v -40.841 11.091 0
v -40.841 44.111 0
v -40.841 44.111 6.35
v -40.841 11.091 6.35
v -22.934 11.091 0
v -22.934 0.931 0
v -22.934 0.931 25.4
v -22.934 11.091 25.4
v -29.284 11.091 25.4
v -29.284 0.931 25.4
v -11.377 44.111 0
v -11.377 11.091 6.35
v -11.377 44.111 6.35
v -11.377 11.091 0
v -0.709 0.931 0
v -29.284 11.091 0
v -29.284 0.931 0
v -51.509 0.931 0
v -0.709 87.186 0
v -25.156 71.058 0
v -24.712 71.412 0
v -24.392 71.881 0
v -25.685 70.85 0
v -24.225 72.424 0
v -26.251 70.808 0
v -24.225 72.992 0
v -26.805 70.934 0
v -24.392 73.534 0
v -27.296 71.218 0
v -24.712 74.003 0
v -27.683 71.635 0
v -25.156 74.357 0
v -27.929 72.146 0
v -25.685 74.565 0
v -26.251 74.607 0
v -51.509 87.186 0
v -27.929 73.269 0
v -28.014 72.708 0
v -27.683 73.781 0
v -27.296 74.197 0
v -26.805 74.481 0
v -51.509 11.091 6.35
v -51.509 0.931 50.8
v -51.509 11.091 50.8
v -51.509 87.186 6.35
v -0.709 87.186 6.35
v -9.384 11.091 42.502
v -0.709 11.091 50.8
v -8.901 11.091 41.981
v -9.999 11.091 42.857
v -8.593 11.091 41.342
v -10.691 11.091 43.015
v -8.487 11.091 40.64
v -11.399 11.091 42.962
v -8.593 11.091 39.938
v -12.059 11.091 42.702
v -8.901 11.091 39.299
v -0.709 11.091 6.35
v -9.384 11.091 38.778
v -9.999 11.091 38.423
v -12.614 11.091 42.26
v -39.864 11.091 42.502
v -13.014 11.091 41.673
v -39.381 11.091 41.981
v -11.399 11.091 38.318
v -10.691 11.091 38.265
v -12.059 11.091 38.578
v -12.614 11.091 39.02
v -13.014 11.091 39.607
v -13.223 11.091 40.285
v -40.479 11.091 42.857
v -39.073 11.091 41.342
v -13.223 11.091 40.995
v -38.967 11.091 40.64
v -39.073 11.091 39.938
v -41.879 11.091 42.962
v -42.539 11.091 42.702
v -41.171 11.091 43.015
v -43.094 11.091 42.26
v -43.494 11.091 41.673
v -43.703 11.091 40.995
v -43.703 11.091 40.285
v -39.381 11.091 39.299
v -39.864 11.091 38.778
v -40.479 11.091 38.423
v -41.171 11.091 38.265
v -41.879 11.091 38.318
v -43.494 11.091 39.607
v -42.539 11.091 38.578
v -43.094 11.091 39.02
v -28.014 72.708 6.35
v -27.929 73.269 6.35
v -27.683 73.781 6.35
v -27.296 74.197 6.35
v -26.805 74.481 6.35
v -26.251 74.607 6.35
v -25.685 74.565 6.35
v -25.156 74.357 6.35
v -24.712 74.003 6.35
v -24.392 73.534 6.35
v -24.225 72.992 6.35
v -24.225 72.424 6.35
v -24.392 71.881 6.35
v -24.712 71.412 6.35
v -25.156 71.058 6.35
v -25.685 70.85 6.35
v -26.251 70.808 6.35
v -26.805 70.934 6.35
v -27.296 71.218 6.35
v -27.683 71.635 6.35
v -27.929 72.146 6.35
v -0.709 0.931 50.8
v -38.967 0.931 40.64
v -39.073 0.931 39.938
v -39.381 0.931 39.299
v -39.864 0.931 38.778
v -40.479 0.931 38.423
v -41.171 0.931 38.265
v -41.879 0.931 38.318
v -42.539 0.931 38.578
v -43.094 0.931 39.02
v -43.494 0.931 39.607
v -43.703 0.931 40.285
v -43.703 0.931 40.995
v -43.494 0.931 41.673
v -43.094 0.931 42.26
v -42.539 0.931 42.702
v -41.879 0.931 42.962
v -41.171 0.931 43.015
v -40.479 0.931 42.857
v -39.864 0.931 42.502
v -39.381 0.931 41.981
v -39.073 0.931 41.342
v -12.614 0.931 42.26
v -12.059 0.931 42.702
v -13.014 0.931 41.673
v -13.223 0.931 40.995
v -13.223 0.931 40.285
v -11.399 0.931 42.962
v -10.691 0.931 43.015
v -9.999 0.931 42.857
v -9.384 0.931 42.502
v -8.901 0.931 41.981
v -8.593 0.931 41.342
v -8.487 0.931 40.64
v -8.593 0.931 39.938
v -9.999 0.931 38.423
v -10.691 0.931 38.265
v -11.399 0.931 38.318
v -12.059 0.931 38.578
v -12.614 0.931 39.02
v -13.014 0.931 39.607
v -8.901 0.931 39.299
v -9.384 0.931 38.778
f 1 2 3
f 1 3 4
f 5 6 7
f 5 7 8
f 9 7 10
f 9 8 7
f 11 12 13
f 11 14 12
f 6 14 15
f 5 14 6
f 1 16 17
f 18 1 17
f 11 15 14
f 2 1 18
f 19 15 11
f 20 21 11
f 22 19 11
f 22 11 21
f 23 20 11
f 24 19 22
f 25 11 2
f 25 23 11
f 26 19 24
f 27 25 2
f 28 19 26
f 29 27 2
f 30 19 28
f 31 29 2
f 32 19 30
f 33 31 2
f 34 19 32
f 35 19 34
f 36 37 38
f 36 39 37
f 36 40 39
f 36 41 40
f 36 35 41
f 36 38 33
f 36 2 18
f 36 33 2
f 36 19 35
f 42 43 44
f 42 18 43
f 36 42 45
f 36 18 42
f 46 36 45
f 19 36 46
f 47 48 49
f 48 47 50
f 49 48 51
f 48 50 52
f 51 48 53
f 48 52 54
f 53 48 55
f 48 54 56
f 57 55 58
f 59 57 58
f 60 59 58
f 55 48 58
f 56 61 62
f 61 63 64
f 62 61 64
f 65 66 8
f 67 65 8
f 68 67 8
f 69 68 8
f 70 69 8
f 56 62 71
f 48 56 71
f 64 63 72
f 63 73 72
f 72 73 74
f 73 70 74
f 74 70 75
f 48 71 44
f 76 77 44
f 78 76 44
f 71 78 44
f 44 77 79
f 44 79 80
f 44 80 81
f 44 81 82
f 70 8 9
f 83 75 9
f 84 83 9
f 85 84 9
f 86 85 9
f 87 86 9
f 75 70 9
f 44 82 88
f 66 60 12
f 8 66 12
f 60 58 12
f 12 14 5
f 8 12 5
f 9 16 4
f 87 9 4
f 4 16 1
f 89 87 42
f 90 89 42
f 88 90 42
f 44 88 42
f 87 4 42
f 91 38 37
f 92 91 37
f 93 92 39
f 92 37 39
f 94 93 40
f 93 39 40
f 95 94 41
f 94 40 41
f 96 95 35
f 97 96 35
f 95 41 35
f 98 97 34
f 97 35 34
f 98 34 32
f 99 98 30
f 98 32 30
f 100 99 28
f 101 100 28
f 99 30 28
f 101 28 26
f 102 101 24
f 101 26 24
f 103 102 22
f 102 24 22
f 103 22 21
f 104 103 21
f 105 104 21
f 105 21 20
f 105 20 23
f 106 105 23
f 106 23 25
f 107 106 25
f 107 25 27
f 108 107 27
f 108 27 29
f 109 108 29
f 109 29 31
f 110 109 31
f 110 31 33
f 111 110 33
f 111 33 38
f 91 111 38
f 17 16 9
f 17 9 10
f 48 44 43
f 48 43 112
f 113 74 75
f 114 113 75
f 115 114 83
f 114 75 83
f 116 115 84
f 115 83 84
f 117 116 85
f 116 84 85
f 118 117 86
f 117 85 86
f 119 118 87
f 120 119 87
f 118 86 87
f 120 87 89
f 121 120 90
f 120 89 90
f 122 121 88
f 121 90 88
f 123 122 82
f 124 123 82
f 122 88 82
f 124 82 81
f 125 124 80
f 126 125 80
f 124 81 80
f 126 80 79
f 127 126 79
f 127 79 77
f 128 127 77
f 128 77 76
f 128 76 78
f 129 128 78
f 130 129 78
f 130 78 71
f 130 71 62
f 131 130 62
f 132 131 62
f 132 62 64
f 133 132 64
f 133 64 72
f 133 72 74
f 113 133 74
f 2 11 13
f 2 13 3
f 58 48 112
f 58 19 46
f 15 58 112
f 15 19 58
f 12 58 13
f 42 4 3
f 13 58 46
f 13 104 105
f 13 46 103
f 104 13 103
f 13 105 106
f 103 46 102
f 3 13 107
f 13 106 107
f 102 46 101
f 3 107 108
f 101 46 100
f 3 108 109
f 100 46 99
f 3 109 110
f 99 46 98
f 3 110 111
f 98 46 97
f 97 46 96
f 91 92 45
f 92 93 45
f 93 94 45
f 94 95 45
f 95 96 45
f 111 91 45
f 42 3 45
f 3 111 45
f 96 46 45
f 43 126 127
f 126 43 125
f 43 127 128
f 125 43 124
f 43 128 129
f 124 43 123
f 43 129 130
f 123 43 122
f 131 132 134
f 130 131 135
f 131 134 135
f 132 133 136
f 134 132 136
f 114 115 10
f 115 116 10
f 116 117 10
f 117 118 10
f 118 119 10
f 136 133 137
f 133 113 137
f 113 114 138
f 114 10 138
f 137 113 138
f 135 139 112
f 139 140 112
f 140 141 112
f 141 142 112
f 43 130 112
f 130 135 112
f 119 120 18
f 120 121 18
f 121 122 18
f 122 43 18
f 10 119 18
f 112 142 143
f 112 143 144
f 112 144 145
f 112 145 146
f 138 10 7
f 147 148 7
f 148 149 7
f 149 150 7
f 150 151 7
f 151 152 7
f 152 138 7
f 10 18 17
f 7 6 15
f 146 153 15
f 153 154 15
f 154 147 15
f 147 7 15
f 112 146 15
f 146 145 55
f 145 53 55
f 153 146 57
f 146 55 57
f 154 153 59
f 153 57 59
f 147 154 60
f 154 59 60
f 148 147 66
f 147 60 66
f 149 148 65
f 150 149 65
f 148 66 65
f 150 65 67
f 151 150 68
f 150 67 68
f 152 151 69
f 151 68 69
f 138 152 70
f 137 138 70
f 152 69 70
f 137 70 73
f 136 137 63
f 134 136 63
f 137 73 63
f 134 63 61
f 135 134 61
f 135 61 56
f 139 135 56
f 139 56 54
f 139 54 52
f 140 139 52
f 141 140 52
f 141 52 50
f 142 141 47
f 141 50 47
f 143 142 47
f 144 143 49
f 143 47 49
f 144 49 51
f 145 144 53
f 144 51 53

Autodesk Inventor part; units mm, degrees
ref_plane "YZ Plane" through (0, 0, 0) normal (1, 0, 0) x (0, 1, 0)
ref_plane "XZ Plane" through (0, 0, 0) normal (0, 1, 0) x (-1, 0, 0)
ref_plane "XY Plane" through (0, 0, 0) normal (0, 0, 1) x (1, 0, 0)
sketch "Sketch1" plane through (0, 0, 0) normal (0, 0, 1) x (1, 0, 0)
  line L0 (-51.5087, 0.9312) -> (-0.7087, 0.9312)
  line L1 (-0.7087, 0.9312) -> (-0.7087, 11.0912)
  line L2 (-0.7087, 11.0912) -> (-51.5087, 11.0912)
  line L3 (-51.5087, 11.0912) -> (-51.5087, 0.9312)
  dimension "d1" = 10.16
  dimension "d2" = 50.8
extrude "Extrusion1" add sketch "Sketch1" along normal blind 50.8
sketch "Sketch2" plane through (0, 0, 0) normal (0, 0, -1) x (-1, 0, 0)
  arc A0 (43.6087, 20.9733) -> (43.6087, 27.9733) centre (43.6087, 24.4733) ccw
  line L0 (8.6087, 27.9733) -> (12.5532, 27.9733)
  line L1 (8.6087, 27.9733) -> (12.5532, 27.9733)
  line L2 (8.6087, 20.9733) -> (12.5532, 20.9733)
  line L3 (8.6087, 20.9733) -> (12.5532, 20.9733)
  arc A1 (9.0398, 27.9733) -> (9.0398, 20.9733) centre (8.6512, 24.4733) ccw
  line L4 (43.6087, 27.9733) -> (39.6641, 27.9733)
  line L5 (39.6641, 27.9733) -> (43.6087, 27.9733)
  line L6 (43.6087, 20.9733) -> (39.6641, 20.9733)
  line L7 (39.6641, 20.9733) -> (43.6087, 20.9733)
  arc A2 (18.8087, 11.9789) -> (18.362, 12.8118) centre (17.8087, 11.9789) ccw
  line L8 (18.8087, 8.6771) -> (18.8087, 11.5509)
  line L9 (18.8087, 11.9789) -> (18.8087, 8.6771)
  line L10 (18.8087, 8.6771) -> (18.8087, 7.6771)
  arc A3 (18.8087, 8.6771) -> (19.8087, 7.6771) centre (19.8087, 8.6771) ccw
  line L11 (18.8087, 7.6771) -> (33.4087, 7.6771)
  line L12 (33.4087, 11.9789) -> (33.4087, 11.5509)
  line L13 (33.4087, 7.6771) -> (33.4087, 11.9789)
  arc A4 (33.8554, 12.8118) -> (33.4087, 11.9789) centre (34.4087, 11.9789) ccw
  arc A5 (33.4087, 11.9789) -> (33.4087, 11.9789) centre (34.4087, 11.9789) ccw
  arc A6 (18.8087, 11.9789) -> (18.362, 12.8118) centre (17.8087, 11.9789) ccw
  arc A7 (12.5532, 20.9733) -> (18.362, 12.8118) centre (26.1087, 24.4733) ccw
  arc A8 (33.8554, 12.8118) -> (39.6641, 20.9733) centre (26.1087, 24.4733) ccw
  arc A9 (39.6641, 27.9733) -> (12.5532, 27.9733) centre (26.1087, 24.4733) ccw
  line L14 (0.7087, 11.0912) -> (51.5087, 11.0912) projected
  circle A10 centre (26.1087, 24.4733) radius 14
  line L15 (0.7087, 0.9312) -> (0.7087, 11.0912) projected
  line L16 (0.7087, 11.0912) -> (51.5087, 11.0912)
  line L17 (51.5087, 11.0912) -> (51.5087, 61.8912)
  line L18 (51.5087, 61.8912) -> (0.7087, 61.8912)
  line L19 (0.7087, 61.8912) -> (0.7087, 11.0912)
  line L20 (11.3767, 28.2833) -> (11.3767, 11.0912)
  line L21 (11.3767, 28.2833) -> (11.3767, 44.1112)
  line L22 (11.3767, 44.1112) -> (40.8407, 44.1112)
  line L23 (40.8407, 44.1112) -> (40.8407, 11.0912)
  point P0 (0, 0)
  point P1 (26.1087, 11.0912)
  dimension "d6" = 0
  dimension "d7" = 50.8
  dimension "d9" = 14.732
  dimension "d10" = 14.732
  dimension "d11" = 33.02
extrude "Extrusion2" add sketch "Sketch2" against normal blind 6.35 contours L6 L23 L4 A0 | A0 L4 L23 L22 L21 L20 L0 A1 L2 L14 L19 L18 L17 L6 | L20 L2 A1 L0
sketch "Sketch3" plane through (0, 0, 0) normal (0, 0, -1) x (-1, 0, 0)
  arc A0 (43.6087, 24.541) -> (43.6087, 31.541) centre (43.6087, 28.041) ccw
  line L0 (8.6087, 31.541) -> (12.5532, 31.541)
  line L1 (8.6087, 31.541) -> (12.5532, 31.541)
  line L2 (8.6087, 24.541) -> (12.5532, 24.541)
  line L3 (8.6087, 24.541) -> (12.5532, 24.541)
  arc A1 (9.0398, 31.541) -> (9.0398, 24.541) centre (8.6512, 28.041) ccw
  line L4 (43.6087, 31.541) -> (39.6641, 31.541)
  line L5 (39.6641, 31.541) -> (43.6087, 31.541)
  line L6 (43.6087, 24.541) -> (39.6641, 24.541)
  line L7 (39.6641, 24.541) -> (43.6087, 24.541)
  arc A2 (18.8087, 15.5466) -> (18.362, 16.3795) centre (17.8087, 15.5466) ccw
  line L8 (18.8087, 12.2448) -> (18.8087, 15.1185)
  line L9 (18.8087, 15.5466) -> (18.8087, 12.2448)
  line L10 (18.8087, 12.2448) -> (18.8087, 11.2448)
  arc A3 (18.8087, 12.2448) -> (19.8087, 11.2448) centre (19.8087, 12.2448) ccw
  line L11 (18.8087, 11.2448) -> (33.4087, 11.2448)
  line L12 (33.4087, 15.5466) -> (33.4087, 15.1185)
  line L13 (33.4087, 11.2448) -> (33.4087, 15.5466)
  arc A4 (33.8554, 16.3795) -> (33.4087, 15.5466) centre (34.4087, 15.5466) ccw
  arc A5 (33.4087, 15.5466) -> (33.4087, 15.5466) centre (34.4087, 15.5466) ccw
  arc A6 (18.8087, 15.5466) -> (18.362, 16.3795) centre (17.8087, 15.5466) ccw
  arc A7 (12.5532, 24.541) -> (18.362, 16.3795) centre (26.1087, 28.041) ccw
  arc A8 (33.8554, 16.3795) -> (39.6641, 24.541) centre (26.1087, 28.041) ccw
  arc A9 (39.6641, 31.541) -> (12.5532, 31.541) centre (26.1087, 28.041) ccw
  line L14 (11.3767, 11.0912) -> (40.8407, 11.0912) projected
  circle A10 centre (26.1087, 28.041) radius 25.7175
  circle A11 centre (26.1087, 61.7236) radius 7.62
  line L15 (0.7087, 61.8912) -> (51.5087, 61.8912) projected
  line L16 (0.7087, 0.9312) -> (0.7087, 61.8912) projected
  line L17 (0.7087, 61.8912) -> (51.5087, 61.8912)
  line L18 (51.5087, 61.8912) -> (51.5087, 76.3692)
  line L19 (51.5087, 76.3692) -> (0.7087, 76.3692)
  line L20 (0.7087, 76.3692) -> (0.7087, 61.8912)
  point P0 (0, 0)
  point P1 (26.1087, 11.0912)
  point P2 (26.1087, 61.8912)
  dimension "d15" = 0
  dimension "d16" = 51.435
  dimension "d17" = 15.24
  dimension "d18" = 0
  dimension "d19" = 14.478
extrude "Extrusion3" add sketch "Sketch3" against normal blind 6.35 contours L20 L19 L18 L15 A11 | A11 L15 picked at (24.5986, 64.5356)
sketch "Sketch5" plane through (0, 0, 0) normal (0, 0, -1) x (-1, 0, 0)
  line L0 (0.7087, 11.0912) -> (51.5087, 11.0912) projected
  line L1 (26.1087, 11.0912) -> (26.1087, 35.6872)
  line L2 (26.1087, 35.6872) -> (26.1087, 61.4047)
  circle A0 centre (26.1087, 72.7077) radius 7.62
  circle A1 centre (26.1087, 72.7077) radius 1.905
  line L3 (0.7087, 76.3692) -> (51.5087, 76.3692) projected
  point P0 (0, 0)
  dimension "d26" = 24.596
  dimension "d27" = 25.7175
  dimension "d28" = 15.24
  dimension "d29" = 11.303
  dimension "d30" = 3.81
extrude "Extrusion5" cut sketch "Sketch5" against normal up to next contours A1
sketch "Sketch6" plane through (0, 0, 0) normal (0, 0, -1) x (-1, 0, 0)
  line L0 (0.7087, 76.3692) -> (51.5087, 76.3692) projected
  line L1 (0.7087, 76.3692) -> (51.5087, 76.3692)
  line L2 (51.5087, 76.3692) -> (51.5087, 87.1857)
  line L3 (51.5087, 87.1857) -> (0.7087, 87.1857)
  line L4 (0.7087, 87.1857) -> (0.7087, 76.3692)
  circle A0 centre (26.1087, 72.7077) radius 1.905 projected
  point P0 (0, 0)
  dimension "d33" = 14.478
extrude "Extrusion6" add sketch "Sketch6" against normal blind 6.35 contours L4 L3 L2 L0
sketch "Sketch8" plane through (-51.5087, 11.0912, 50.8) normal (0, 1, 0) x (1, 0, 0)
  circle A0 centre (40.64, 10.16) radius 2.3813
  circle A1 centre (10.16, 10.16) radius 2.3813
  line L0 (50.8, 0) -> (0, 0) projected
  line L1 (50.8, 50.8) -> (50.8, 0) projected
  line L2 (0, 44.45) -> (0, 0) projected
  point P0 (51.5087, 50.8)
  dimension "d36" = 4.7625
  dimension "d37" = 4.7625
  dimension "d38" = 10.16
  dimension "d39" = 10.16
  dimension "d40" = 10.16
  dimension "d41" = 10.16
extrude "Extrusion7" cut sketch "Sketch8" against normal up to next
sketch "Sketch9" plane through (0, 0, 0) normal (0, 0, -1) x (-1, 0, 0)
  line L0 (11.3767, 11.0912) -> (40.8407, 11.0912) projected
  line L1 (26.1087, 11.0912) -> (26.1087, 0.9312)
  line L2 (51.5087, 0.9312) -> (0.7087, 0.9312) projected
  line L3 (22.9337, 11.0912) -> (29.2837, 11.0912)
  line L4 (29.2837, 11.0912) -> (29.2837, 0.9312)
  line L5 (29.2837, 0.9312) -> (22.9337, 0.9312)
  line L6 (22.9337, 0.9312) -> (22.9337, 11.0912)
  point P0 (0, 0)
  dimension "d45" = 6.35
  dimension "d46" = 3.175
extrude "Extrusion8" cut sketch "Sketch9" against normal blind 25.4
sketch "Sketch10" plane through (0, 0, 0) normal (0, 0, -1) x (-1, 0, 0)
  point P0 (0, 0)
properties part number "End Frame 2"
